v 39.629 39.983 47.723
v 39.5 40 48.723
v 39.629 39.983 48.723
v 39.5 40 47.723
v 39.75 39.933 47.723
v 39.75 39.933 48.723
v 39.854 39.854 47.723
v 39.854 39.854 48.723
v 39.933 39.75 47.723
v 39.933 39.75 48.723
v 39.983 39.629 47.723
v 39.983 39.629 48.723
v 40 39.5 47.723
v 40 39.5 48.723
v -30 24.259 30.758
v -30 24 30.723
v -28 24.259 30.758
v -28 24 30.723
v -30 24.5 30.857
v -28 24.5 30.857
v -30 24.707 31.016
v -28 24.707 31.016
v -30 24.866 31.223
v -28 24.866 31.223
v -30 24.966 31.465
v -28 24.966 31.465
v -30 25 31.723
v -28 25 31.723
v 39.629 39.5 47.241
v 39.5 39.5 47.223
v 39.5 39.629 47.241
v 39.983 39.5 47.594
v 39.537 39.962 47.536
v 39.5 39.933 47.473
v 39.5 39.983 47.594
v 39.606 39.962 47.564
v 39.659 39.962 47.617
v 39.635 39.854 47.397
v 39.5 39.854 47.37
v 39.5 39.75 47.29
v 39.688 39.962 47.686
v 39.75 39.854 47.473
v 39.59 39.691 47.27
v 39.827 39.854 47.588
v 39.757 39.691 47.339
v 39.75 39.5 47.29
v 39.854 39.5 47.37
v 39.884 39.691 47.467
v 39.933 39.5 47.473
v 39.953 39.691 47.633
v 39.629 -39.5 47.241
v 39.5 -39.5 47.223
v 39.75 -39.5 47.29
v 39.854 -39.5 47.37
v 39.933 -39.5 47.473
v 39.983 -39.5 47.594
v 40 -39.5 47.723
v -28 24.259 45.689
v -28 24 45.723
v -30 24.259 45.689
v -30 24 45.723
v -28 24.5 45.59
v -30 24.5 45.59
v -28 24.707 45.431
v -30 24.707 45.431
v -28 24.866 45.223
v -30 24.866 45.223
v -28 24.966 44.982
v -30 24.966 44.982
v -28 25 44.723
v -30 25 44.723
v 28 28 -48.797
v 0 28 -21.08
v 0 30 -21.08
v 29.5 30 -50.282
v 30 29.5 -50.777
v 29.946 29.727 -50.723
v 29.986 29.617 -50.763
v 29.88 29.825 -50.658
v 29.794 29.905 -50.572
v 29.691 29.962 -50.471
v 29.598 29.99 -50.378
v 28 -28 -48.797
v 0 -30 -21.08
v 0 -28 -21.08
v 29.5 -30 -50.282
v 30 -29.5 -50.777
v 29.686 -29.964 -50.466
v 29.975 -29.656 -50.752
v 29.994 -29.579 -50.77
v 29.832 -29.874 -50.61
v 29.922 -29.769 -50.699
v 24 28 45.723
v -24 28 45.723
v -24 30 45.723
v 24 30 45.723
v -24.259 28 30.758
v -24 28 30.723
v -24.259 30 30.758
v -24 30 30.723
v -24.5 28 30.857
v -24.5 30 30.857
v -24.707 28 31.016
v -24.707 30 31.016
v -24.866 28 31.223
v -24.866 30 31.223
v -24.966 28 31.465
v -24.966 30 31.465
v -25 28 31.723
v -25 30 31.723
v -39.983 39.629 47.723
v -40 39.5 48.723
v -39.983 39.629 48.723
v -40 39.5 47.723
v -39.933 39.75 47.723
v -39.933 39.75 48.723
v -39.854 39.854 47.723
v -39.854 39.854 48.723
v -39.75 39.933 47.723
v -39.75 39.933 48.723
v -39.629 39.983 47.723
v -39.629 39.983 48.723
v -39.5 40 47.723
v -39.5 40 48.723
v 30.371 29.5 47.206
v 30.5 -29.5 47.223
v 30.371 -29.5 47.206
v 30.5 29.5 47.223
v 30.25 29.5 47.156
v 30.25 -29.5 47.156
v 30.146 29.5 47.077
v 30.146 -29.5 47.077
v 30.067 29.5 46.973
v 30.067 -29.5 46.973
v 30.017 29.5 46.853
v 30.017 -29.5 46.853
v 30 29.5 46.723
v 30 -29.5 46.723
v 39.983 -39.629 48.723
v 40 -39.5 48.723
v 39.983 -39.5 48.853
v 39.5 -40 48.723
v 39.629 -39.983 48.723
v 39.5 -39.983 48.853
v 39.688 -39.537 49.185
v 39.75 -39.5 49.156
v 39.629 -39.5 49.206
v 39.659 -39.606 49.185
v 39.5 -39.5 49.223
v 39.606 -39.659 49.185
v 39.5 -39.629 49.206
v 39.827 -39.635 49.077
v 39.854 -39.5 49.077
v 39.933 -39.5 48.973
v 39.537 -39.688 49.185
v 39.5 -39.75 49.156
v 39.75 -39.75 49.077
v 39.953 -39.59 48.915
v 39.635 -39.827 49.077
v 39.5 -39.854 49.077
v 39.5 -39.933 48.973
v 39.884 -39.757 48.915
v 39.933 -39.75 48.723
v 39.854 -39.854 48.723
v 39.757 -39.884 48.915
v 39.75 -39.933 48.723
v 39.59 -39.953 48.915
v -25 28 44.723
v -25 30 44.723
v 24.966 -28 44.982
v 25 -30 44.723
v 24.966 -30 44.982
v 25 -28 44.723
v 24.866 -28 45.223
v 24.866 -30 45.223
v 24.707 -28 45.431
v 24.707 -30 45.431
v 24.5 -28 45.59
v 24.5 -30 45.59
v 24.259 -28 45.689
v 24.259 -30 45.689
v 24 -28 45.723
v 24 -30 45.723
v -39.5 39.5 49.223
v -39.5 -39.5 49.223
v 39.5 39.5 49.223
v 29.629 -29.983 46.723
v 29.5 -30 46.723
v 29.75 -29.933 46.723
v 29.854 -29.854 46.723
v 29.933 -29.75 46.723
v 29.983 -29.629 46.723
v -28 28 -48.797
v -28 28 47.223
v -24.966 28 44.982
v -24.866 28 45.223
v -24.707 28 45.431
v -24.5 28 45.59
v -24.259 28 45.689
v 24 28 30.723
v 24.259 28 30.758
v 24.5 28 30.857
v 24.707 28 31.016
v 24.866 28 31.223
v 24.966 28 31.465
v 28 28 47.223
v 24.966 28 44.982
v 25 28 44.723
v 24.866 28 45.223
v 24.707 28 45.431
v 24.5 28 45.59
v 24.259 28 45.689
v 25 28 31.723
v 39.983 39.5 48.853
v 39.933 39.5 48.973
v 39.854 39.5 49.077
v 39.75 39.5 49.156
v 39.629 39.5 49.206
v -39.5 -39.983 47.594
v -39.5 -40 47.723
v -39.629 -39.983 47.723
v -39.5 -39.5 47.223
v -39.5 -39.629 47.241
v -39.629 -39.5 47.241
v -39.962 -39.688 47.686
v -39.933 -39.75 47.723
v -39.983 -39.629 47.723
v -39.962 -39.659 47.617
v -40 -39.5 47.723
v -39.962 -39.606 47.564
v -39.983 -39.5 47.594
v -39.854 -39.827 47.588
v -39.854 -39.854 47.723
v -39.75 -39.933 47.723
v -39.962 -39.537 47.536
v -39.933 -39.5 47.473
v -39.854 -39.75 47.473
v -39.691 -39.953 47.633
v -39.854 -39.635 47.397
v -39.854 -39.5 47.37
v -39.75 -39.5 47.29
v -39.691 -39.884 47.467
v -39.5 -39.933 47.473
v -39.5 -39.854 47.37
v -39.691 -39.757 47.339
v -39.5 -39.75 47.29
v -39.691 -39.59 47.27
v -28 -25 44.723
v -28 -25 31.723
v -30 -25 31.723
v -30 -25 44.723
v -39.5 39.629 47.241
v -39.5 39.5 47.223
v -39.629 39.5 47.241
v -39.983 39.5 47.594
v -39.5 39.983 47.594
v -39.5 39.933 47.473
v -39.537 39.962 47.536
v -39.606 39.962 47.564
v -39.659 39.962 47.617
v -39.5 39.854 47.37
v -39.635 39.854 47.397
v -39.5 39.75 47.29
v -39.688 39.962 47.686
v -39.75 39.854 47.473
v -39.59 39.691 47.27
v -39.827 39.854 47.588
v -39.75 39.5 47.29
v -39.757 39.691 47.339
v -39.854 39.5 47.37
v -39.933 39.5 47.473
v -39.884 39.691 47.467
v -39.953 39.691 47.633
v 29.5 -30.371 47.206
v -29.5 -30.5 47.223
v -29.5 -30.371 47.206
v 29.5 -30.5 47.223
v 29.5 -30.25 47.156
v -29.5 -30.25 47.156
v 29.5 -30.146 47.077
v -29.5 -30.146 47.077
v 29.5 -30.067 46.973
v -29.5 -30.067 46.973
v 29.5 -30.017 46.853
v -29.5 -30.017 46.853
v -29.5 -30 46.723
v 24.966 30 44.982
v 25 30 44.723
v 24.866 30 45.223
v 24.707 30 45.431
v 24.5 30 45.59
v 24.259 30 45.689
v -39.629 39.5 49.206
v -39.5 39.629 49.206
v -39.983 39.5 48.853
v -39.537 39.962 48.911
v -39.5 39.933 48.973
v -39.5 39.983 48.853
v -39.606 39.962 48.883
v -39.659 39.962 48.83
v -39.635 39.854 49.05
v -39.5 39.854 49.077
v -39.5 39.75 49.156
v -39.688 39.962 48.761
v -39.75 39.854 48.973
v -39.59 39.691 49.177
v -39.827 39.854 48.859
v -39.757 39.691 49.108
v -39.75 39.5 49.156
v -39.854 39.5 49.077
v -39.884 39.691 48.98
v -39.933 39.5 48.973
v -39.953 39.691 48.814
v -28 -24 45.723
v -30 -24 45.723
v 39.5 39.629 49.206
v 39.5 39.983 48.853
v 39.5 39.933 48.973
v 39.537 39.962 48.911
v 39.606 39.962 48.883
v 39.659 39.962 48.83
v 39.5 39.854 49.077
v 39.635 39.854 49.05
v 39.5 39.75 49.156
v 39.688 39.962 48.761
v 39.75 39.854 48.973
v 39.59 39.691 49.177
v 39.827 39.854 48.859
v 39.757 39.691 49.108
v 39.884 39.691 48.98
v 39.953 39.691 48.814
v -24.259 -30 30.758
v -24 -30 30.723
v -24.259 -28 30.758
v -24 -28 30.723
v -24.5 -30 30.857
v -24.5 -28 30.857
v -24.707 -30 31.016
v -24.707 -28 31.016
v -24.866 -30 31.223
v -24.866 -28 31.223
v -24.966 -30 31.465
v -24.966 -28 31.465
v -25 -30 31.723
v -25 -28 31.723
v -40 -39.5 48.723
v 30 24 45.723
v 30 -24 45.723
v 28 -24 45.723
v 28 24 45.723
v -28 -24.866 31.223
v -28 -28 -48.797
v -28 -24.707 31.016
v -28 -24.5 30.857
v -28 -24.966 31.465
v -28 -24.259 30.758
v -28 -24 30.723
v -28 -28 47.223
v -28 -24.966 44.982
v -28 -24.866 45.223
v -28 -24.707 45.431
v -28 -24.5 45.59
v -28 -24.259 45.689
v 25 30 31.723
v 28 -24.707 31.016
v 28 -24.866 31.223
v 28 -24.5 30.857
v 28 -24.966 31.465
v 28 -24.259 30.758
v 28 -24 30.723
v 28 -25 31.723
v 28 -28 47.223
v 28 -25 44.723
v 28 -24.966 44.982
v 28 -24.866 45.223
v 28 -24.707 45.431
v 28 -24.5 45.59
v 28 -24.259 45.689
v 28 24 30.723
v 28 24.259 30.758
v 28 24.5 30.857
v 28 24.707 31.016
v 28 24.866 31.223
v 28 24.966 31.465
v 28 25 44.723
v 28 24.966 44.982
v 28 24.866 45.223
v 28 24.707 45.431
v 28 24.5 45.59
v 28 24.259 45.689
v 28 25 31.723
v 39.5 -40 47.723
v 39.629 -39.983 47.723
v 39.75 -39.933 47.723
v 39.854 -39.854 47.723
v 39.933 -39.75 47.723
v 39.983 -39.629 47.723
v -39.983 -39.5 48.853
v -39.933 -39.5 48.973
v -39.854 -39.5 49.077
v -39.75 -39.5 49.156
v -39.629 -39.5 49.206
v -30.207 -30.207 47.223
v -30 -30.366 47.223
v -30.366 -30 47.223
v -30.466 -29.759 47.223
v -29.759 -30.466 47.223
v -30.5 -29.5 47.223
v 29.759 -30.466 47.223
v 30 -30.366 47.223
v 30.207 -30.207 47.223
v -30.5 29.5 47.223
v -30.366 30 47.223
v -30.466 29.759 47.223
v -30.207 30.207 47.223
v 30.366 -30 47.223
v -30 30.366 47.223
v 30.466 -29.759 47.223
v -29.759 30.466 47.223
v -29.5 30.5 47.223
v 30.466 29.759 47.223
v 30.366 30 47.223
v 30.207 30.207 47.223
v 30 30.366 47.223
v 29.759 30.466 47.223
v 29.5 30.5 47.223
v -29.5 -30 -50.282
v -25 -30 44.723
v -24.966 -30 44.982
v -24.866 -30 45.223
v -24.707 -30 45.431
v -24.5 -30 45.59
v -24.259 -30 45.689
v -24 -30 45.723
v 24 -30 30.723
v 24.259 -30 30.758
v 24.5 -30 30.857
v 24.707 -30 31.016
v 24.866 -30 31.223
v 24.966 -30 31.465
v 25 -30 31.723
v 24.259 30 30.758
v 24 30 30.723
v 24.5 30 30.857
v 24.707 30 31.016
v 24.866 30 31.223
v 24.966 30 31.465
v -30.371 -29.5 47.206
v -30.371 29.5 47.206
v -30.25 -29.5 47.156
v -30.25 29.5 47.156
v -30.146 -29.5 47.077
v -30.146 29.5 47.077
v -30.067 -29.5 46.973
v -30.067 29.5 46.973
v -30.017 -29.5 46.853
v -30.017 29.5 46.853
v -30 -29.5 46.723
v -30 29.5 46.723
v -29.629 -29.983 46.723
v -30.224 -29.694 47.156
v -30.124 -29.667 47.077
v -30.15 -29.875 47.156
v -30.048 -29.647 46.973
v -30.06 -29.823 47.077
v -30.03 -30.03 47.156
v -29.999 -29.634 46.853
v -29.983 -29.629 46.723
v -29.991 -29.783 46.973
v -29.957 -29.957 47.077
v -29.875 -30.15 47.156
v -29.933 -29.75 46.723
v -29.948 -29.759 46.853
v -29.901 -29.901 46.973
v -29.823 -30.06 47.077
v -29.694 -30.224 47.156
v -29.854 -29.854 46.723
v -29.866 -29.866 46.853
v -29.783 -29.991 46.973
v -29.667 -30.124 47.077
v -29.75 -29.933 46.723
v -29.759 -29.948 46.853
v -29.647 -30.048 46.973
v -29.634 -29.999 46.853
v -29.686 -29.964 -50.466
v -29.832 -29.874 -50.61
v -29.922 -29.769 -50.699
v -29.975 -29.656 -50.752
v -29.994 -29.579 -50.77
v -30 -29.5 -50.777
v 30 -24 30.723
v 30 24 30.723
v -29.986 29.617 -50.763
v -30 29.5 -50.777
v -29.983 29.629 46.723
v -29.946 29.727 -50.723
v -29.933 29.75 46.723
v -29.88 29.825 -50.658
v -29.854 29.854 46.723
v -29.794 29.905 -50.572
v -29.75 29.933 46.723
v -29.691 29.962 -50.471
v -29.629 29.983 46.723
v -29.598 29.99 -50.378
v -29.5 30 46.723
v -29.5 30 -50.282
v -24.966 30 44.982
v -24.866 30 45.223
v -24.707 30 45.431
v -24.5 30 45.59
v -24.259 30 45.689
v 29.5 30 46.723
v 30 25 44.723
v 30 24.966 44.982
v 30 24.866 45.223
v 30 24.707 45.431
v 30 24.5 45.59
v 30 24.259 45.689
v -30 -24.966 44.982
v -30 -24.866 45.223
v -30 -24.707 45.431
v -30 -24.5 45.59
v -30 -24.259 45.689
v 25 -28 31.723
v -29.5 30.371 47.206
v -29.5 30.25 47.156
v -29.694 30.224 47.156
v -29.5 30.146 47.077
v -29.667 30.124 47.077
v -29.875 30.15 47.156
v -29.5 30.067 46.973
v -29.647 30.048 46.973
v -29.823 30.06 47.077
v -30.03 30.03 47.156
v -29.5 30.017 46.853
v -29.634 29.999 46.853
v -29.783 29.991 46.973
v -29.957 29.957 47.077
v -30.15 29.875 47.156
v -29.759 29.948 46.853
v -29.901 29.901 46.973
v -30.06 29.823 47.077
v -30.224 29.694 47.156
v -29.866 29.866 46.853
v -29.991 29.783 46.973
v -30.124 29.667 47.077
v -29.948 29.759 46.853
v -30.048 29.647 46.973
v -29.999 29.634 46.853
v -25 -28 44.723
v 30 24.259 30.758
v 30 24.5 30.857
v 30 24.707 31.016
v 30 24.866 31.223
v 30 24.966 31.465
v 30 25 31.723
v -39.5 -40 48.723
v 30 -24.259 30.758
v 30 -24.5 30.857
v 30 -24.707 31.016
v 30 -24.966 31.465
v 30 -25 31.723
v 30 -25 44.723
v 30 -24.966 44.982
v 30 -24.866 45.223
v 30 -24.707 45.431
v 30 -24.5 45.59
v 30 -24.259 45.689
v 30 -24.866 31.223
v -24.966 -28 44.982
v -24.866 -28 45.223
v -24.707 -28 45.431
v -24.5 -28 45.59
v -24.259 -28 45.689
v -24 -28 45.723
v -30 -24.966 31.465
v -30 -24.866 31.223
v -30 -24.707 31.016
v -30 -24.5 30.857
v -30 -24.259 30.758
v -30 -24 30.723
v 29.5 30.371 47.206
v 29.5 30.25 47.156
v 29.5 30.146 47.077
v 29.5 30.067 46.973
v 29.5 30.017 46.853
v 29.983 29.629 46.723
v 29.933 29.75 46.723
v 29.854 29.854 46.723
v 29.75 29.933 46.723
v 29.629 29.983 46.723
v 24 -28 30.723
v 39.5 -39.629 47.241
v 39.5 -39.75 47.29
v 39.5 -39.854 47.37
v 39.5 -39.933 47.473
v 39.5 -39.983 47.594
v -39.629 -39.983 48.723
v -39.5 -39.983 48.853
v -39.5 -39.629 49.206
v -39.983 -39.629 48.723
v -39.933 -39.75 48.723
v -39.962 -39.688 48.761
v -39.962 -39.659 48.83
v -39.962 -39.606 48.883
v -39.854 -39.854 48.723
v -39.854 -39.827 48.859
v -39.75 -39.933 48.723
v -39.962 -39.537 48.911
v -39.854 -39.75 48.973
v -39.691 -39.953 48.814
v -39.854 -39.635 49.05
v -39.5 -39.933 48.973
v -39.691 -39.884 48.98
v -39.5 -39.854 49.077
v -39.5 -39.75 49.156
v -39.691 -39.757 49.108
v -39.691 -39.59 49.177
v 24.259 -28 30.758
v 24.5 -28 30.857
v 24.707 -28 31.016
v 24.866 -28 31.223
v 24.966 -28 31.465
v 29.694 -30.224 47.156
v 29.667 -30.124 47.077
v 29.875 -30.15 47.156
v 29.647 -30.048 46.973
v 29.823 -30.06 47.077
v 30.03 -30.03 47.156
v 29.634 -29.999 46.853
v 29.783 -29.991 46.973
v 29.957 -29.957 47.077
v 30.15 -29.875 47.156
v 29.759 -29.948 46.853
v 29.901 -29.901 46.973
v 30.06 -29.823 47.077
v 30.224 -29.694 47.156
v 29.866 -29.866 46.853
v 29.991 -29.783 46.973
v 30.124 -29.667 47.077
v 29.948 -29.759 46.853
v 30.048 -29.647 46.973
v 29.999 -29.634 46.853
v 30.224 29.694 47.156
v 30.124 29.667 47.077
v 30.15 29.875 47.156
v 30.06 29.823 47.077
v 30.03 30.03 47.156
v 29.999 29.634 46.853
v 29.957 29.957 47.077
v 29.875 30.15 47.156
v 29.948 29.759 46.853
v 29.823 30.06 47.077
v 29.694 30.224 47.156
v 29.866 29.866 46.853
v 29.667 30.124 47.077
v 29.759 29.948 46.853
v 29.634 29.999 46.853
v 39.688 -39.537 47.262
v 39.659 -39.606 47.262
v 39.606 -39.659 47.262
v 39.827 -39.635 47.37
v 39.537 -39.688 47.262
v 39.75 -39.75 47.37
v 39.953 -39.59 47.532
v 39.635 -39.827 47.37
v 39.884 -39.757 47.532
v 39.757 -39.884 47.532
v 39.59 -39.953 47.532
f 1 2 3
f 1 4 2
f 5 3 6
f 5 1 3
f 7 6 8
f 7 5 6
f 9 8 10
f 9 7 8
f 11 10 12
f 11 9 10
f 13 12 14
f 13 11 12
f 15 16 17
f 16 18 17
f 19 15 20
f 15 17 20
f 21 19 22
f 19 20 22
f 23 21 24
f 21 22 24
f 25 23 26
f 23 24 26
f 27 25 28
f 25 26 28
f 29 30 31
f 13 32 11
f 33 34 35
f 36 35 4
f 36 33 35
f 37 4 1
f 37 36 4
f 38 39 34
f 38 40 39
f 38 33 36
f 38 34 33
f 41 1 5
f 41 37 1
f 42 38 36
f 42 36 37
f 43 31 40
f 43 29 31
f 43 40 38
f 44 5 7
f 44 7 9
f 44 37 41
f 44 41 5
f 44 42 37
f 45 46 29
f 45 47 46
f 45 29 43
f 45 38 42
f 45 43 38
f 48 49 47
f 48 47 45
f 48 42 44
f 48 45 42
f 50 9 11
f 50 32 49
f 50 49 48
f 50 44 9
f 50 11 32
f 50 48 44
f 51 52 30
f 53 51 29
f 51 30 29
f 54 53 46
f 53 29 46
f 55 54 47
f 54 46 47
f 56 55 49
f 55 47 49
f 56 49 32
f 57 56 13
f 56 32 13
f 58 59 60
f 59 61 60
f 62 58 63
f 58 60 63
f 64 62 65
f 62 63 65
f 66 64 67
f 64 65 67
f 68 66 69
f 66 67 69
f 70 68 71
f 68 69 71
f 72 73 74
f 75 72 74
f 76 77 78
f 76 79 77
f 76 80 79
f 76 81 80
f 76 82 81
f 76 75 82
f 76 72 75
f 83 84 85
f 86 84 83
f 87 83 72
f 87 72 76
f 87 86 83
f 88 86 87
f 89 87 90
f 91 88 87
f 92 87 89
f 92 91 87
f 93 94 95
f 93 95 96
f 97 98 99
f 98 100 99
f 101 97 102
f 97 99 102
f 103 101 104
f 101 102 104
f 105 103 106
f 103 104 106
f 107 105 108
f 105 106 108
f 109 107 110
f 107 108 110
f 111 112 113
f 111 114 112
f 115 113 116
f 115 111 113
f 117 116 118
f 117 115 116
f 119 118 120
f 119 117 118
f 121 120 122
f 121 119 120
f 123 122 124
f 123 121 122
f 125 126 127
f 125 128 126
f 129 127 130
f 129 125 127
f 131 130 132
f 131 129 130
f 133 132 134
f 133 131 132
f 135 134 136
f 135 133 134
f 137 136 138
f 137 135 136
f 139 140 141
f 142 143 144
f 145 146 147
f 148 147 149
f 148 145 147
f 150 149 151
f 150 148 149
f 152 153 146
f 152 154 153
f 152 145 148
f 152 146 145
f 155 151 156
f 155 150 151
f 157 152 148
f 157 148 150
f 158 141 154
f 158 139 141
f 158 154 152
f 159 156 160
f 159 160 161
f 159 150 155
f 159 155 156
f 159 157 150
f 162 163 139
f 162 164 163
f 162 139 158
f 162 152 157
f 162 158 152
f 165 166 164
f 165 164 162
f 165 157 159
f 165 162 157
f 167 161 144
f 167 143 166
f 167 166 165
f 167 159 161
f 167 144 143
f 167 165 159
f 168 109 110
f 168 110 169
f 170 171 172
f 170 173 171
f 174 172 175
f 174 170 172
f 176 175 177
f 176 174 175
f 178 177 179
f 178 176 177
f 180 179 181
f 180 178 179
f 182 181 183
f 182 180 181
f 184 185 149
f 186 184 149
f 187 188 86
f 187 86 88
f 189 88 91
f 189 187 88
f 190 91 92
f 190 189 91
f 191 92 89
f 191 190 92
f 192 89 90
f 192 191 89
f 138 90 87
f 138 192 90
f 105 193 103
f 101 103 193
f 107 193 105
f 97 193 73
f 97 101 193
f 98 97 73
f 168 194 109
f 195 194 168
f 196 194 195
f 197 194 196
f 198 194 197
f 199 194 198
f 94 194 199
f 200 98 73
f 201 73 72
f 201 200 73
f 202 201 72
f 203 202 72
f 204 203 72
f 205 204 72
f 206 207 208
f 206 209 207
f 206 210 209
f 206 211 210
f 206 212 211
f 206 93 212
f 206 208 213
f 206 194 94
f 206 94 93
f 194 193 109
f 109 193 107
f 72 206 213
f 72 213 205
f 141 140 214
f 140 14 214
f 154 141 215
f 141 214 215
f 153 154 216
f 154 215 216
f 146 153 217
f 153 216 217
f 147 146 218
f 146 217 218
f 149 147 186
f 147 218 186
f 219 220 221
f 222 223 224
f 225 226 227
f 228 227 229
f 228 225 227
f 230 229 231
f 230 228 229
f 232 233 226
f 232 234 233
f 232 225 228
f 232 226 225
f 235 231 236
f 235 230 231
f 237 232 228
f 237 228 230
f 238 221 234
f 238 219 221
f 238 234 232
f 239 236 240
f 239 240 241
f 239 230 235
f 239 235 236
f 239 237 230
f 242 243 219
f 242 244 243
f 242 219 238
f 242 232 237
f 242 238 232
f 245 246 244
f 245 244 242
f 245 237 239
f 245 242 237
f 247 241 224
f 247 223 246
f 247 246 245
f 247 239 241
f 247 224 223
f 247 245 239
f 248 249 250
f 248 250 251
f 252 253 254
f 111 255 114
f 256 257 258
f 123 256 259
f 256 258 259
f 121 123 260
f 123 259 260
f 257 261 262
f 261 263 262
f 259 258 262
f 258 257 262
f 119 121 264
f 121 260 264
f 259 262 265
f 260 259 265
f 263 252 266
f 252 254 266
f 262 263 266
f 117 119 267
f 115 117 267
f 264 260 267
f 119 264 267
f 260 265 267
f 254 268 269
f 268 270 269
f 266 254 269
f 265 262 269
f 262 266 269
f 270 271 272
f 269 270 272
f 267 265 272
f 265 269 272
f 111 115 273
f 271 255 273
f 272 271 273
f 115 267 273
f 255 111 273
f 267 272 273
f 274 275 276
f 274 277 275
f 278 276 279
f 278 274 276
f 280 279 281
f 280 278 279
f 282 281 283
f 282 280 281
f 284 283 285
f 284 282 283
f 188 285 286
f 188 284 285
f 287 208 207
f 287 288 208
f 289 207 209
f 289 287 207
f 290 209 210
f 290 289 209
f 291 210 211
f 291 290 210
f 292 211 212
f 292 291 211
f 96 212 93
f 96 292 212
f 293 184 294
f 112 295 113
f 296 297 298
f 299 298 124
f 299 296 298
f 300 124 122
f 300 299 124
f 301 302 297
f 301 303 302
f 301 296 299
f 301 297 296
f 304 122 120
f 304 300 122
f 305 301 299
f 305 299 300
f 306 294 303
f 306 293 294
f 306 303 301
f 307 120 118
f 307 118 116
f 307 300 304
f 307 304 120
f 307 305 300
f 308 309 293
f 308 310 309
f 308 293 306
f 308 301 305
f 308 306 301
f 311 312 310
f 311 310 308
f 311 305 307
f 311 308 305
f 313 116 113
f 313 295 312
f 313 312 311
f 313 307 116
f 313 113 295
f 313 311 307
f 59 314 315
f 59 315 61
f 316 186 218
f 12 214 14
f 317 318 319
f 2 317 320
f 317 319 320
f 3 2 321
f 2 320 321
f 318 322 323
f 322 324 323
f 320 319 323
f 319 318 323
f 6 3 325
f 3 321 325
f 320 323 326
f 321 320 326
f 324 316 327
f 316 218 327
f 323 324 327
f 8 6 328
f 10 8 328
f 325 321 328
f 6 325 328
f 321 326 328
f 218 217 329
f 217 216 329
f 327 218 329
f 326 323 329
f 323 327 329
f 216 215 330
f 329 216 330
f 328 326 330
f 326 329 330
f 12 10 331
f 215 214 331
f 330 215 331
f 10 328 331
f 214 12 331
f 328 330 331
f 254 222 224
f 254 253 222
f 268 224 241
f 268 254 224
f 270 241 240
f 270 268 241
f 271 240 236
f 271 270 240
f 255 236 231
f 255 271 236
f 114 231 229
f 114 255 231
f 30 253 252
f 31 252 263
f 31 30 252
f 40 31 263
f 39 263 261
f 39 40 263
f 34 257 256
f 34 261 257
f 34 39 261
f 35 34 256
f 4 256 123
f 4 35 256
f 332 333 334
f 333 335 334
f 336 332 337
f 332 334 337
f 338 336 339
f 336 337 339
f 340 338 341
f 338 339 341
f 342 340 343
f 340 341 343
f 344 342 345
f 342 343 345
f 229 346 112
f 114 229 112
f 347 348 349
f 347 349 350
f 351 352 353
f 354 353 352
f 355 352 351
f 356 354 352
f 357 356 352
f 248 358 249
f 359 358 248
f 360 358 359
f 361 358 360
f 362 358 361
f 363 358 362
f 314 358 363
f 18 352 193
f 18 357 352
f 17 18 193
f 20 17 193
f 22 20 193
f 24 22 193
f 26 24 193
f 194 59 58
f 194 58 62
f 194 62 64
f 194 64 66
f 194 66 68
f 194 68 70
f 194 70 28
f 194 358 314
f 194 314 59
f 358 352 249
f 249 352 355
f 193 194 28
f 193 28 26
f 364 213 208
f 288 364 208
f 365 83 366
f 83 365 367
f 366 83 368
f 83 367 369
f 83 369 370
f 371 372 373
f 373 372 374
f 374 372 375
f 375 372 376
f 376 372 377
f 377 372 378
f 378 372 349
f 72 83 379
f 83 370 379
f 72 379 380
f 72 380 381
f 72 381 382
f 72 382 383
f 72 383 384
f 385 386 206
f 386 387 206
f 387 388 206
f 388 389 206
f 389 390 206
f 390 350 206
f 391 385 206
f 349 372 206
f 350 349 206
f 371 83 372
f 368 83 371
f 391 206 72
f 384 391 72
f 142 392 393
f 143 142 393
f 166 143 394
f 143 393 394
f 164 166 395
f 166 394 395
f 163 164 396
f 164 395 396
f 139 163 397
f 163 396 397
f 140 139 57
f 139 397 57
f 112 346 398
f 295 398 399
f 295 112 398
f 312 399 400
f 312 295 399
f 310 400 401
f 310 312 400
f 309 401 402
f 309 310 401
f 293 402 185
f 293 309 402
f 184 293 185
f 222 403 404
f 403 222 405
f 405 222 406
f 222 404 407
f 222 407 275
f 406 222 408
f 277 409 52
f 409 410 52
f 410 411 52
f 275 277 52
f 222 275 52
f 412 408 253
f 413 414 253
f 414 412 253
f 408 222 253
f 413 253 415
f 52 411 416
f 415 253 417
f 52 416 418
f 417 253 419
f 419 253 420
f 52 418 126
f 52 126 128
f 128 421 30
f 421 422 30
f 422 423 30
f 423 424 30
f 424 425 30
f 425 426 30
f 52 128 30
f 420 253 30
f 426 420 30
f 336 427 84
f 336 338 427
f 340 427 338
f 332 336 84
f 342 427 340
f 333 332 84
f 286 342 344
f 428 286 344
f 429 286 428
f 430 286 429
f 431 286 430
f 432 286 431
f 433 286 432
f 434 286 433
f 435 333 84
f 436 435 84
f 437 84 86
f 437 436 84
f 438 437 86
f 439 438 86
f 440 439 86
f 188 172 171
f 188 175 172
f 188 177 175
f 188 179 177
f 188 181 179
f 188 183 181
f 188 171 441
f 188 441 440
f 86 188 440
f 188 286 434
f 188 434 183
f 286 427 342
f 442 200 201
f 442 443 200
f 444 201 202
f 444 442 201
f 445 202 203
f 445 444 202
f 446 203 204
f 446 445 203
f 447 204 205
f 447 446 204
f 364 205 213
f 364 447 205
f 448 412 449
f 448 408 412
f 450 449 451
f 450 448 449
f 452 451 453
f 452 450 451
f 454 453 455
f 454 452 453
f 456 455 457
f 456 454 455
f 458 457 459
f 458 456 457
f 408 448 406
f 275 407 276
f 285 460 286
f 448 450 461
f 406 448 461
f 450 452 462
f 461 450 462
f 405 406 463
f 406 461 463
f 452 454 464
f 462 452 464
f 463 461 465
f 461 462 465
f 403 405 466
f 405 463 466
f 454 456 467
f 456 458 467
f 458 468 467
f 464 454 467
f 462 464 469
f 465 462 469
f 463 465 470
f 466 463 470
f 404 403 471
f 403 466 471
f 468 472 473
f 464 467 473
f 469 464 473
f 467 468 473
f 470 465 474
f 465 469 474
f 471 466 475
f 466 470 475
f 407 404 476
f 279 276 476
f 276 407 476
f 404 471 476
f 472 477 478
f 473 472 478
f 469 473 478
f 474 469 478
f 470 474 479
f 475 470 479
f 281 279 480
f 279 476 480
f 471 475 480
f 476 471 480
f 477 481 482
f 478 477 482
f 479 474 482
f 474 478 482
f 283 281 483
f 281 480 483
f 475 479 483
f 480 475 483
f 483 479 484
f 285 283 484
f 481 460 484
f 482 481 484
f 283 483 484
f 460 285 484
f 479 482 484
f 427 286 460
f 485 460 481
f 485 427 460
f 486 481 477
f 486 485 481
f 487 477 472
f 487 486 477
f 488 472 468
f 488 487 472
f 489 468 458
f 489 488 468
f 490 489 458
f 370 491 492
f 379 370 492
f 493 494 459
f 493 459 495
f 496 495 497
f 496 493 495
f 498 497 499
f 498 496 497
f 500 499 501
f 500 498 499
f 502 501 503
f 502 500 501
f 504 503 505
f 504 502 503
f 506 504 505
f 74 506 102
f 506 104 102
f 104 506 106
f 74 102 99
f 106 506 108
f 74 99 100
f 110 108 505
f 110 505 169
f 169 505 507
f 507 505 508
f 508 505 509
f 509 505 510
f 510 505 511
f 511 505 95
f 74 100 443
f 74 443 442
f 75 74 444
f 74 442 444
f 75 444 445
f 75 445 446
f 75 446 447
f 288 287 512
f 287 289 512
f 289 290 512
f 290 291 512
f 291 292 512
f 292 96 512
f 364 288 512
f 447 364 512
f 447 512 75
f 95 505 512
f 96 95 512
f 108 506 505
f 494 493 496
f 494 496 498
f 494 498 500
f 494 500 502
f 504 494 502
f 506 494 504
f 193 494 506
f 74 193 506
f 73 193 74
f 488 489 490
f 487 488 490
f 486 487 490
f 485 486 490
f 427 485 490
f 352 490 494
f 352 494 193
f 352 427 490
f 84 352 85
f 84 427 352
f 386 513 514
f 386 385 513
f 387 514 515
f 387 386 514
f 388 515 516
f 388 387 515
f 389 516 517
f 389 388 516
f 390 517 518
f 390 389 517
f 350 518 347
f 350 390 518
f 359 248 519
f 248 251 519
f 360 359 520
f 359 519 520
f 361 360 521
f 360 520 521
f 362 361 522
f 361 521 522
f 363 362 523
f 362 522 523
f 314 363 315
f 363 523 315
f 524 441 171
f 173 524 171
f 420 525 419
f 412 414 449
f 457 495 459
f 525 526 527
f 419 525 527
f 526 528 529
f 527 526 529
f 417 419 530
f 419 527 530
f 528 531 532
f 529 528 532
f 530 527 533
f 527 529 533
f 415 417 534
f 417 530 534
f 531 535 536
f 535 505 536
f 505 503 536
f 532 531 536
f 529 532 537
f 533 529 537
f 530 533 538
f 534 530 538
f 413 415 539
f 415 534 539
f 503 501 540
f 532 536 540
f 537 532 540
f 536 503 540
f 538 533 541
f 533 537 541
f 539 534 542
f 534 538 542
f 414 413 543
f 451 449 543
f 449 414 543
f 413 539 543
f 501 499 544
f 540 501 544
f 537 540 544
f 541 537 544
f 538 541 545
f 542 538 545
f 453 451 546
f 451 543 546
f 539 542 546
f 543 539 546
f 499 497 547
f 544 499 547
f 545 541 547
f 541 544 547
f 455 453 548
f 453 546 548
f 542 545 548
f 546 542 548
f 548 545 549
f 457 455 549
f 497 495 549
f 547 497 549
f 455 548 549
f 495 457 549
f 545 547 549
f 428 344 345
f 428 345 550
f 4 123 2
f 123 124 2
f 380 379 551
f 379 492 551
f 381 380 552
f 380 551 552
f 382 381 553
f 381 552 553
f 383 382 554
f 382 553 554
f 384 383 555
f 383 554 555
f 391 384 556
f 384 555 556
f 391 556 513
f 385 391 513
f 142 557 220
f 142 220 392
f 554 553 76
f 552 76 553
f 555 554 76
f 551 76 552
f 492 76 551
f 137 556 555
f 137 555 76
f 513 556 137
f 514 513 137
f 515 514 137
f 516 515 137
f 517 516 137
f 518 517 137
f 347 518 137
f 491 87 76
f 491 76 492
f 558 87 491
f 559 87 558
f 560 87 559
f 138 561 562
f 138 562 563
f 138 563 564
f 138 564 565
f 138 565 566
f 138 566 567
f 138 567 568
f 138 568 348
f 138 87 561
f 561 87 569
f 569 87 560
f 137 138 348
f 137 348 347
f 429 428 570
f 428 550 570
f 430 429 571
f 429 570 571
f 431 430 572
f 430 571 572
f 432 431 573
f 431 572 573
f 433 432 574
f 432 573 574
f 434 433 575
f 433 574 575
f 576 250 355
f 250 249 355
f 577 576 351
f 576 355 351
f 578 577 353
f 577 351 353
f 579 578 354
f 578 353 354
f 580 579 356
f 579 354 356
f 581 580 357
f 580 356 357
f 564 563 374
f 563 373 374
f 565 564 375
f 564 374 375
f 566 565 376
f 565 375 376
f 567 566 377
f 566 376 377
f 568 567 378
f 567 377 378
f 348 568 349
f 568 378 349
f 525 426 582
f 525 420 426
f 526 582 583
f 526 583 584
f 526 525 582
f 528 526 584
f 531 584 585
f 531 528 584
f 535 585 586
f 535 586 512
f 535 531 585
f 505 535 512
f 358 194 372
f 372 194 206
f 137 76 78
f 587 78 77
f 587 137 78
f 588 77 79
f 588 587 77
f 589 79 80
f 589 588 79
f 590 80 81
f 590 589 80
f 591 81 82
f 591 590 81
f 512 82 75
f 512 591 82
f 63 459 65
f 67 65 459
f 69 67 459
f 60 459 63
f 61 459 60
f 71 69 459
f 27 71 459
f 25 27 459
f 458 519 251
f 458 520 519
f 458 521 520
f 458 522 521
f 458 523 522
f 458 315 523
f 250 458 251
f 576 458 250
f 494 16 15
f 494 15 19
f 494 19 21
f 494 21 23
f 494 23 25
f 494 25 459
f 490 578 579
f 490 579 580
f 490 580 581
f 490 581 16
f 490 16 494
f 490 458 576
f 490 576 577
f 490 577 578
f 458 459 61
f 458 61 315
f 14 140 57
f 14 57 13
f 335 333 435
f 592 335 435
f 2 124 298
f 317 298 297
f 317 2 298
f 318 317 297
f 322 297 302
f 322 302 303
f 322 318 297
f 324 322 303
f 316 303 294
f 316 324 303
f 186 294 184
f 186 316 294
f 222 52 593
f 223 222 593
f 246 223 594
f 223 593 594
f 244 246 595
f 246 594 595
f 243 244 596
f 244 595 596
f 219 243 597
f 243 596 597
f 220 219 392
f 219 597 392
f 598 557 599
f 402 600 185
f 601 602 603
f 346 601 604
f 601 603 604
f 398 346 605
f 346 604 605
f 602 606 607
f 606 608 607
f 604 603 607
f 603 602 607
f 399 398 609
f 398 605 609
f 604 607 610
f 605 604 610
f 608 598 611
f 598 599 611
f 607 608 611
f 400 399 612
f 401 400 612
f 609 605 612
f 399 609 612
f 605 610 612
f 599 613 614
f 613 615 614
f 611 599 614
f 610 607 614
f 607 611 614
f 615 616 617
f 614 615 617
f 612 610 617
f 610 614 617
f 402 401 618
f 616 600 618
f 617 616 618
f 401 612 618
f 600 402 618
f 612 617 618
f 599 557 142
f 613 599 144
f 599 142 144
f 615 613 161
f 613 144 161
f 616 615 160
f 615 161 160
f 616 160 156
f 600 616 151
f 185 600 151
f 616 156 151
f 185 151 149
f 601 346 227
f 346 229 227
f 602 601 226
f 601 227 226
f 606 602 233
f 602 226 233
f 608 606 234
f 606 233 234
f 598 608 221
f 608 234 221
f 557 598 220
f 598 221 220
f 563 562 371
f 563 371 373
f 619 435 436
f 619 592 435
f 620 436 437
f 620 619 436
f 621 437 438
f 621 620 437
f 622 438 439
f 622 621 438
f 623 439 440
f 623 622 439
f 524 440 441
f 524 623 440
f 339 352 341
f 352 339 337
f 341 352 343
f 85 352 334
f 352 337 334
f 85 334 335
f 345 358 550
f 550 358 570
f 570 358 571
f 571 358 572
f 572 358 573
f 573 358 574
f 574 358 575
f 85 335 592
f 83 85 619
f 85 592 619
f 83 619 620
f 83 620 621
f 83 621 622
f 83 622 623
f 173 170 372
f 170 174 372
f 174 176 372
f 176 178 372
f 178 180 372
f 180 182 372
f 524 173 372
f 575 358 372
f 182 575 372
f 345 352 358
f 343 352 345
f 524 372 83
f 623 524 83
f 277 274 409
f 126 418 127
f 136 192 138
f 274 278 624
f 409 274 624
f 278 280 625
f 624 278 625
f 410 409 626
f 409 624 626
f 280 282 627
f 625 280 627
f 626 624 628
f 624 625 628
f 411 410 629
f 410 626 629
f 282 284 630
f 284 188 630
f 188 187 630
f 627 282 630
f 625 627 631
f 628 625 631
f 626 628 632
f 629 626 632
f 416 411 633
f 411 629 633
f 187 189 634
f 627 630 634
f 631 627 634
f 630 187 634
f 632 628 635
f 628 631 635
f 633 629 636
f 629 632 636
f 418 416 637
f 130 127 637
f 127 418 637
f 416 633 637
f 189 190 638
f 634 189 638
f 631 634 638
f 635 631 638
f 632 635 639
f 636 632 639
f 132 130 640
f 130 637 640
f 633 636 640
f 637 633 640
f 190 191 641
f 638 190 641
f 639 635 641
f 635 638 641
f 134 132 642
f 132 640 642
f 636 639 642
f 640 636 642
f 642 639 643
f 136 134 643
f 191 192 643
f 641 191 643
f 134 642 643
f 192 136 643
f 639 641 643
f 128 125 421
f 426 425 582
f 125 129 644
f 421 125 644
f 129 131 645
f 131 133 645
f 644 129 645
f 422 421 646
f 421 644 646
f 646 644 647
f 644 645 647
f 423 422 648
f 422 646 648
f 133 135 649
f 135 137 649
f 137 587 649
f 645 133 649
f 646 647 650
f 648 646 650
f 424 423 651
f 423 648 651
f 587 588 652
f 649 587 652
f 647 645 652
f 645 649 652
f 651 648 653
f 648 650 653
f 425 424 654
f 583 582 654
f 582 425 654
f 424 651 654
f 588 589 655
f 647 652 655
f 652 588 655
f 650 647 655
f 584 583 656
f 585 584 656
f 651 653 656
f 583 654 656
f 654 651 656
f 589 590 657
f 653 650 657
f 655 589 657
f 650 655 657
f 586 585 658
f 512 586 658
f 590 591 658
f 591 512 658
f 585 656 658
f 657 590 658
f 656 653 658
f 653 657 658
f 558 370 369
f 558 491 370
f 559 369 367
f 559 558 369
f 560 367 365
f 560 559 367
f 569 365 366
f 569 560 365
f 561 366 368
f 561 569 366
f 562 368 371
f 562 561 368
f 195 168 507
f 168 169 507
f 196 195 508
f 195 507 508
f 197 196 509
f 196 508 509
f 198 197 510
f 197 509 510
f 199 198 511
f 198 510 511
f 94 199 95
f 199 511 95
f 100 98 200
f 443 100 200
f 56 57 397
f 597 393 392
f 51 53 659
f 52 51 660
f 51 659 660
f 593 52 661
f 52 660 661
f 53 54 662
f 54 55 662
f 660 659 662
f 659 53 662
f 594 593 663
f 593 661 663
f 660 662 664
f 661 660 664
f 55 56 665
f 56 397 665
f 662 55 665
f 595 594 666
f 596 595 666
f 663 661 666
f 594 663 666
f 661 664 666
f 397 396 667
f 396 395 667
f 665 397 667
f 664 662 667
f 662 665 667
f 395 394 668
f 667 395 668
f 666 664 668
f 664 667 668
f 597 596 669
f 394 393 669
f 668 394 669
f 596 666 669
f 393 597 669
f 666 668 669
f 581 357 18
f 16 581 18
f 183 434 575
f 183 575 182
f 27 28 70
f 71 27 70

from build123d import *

# Parameters (mm, degrees)
F1_DEPTH = 30
F2_W     = 56
F2_H     = 56
F3_DEPTH = 100.001
F4_W     = 50
F4_H     = 15
F5_DEPTH = 60
F6_W     = 50
F6_H     = 15
F7_DEPTH = 30
F8_W     = 80
F8_H     = 80
F9_DEPTH = 2
F10_R    = 1
F11_R    = 1
F12_R    = 1
F13_R    = 1
F14_R    = 0.5
F15_R    = 0.5
F16_R    = 0.5


with BuildPart() as f1:
    # F0 (on Front) → F1 (new body, symmetric)
    with BuildSketch(Plane.XZ):
        Polygon((30, 49.2234811187), (0, 49.2234811187), (-30, 49.2234811187), (-30, -50.7765188813), (0, -21.0795458406), (30, -50.7765188813), align=None)
    extrude(amount=F1_DEPTH, both=True)

    # F2 (on face) → F3 (cut, through all)
    with BuildSketch(Plane.XY.offset(49.2234811187)):
        with Locations((-2.794e-06, 0)):
            Rectangle(F2_W, F2_H)
    extrude(amount=-F3_DEPTH, mode=Mode.SUBTRACT)

    # F4 (on face) → F5 (cut)
    with BuildSketch(Plane.XZ.offset(30)):
        with Locations((0, 38.2234811187)):
            Rectangle(F4_W, F4_H)
    extrude(amount=-F5_DEPTH, mode=Mode.SUBTRACT)

    # F6 (on Right) → F7 (cut, symmetric)
    with BuildSketch(Plane.YZ):
        with Locations((0, 38.2234811187)):
            Rectangle(F6_W, F6_H)
    extrude(amount=F7_DEPTH, both=True, mode=Mode.SUBTRACT)

    # F8 (on face) → F9 (join)
    with BuildSketch(Plane.XY.offset(49.2234811187)):
        Rectangle(F8_W, F8_H)
    extrude(amount=-F9_DEPTH)

    # F10
    f10_edges = [f1.edges().sort_by_distance(p)[0] for p in [
        (-29.000001, 25, 30.723481),
        (-29.000001, -25, 30.723481),
        (-29.000001, -25, 45.723481),
        (-29.000001, 25, 45.723481),
    ]]
    fillet(f10_edges, radius=F10_R)

    # F11
    f11_edges = [f1.edges().sort_by_distance(p)[0] for p in [
        (-25, 29, 45.723481),
        (-25, 29, 30.723481),
        (25, 29, 30.723481),
        (25, 29, 45.723481),
    ]]
    fillet(f11_edges, radius=F11_R)

    # F12
    f12_edges = [f1.edges().sort_by_distance(p)[0] for p in [
        (28.999999, 25, 45.723481),
        (28.999999, -25, 45.723481),
        (28.999999, -25, 30.723481),
        (28.999999, 25, 30.723481),
    ]]
    fillet(f12_edges, radius=F12_R)

    # F13
    f13_edges = [f1.edges().sort_by_distance(p)[0] for p in [
        (25, -29, 30.723481),
        (25, -29, 45.723481),
        (-25, -29, 45.723481),
        (-25, -29, 30.723481),
    ]]
    fillet(f13_edges, radius=F13_R)

    # F14
    f14_edges = [f1.edges().sort_by_distance(p)[0] for p in [
        (30, 30, -1.776519),
        (30, -30, -1.776519),
        (-30, 30, -1.776519),
        (-30, -30, -1.776519),
    ]]
    fillet(f14_edges, radius=F14_R)

    # F15
    f15_edges = [f1.edges().sort_by_distance(p)[0] for p in [
        (40, -40, 48.223481),
        (40, 0, 49.223481),
        (40, 0, 47.223481),
        (0, -40, 47.223481),
        (0, -40, 49.223481),
        (-40, -40, 48.223481),
        (-40, 0, 47.223481),
        (-40, 0, 49.223481),
        (0, 40, 47.223481),
        (0, 40, 49.223481),
        (-40, 40, 48.223481),
        (40, 40, 48.223481),
    ]]
    fillet(f15_edges, radius=F15_R)

    # F16
    f16_edges = [f1.edges().sort_by_distance(p)[0] for p in [
        (0, 30, 47.223481),
    ]]
    fillet(f16_edges, radius=F16_R)


solid = f1.part
